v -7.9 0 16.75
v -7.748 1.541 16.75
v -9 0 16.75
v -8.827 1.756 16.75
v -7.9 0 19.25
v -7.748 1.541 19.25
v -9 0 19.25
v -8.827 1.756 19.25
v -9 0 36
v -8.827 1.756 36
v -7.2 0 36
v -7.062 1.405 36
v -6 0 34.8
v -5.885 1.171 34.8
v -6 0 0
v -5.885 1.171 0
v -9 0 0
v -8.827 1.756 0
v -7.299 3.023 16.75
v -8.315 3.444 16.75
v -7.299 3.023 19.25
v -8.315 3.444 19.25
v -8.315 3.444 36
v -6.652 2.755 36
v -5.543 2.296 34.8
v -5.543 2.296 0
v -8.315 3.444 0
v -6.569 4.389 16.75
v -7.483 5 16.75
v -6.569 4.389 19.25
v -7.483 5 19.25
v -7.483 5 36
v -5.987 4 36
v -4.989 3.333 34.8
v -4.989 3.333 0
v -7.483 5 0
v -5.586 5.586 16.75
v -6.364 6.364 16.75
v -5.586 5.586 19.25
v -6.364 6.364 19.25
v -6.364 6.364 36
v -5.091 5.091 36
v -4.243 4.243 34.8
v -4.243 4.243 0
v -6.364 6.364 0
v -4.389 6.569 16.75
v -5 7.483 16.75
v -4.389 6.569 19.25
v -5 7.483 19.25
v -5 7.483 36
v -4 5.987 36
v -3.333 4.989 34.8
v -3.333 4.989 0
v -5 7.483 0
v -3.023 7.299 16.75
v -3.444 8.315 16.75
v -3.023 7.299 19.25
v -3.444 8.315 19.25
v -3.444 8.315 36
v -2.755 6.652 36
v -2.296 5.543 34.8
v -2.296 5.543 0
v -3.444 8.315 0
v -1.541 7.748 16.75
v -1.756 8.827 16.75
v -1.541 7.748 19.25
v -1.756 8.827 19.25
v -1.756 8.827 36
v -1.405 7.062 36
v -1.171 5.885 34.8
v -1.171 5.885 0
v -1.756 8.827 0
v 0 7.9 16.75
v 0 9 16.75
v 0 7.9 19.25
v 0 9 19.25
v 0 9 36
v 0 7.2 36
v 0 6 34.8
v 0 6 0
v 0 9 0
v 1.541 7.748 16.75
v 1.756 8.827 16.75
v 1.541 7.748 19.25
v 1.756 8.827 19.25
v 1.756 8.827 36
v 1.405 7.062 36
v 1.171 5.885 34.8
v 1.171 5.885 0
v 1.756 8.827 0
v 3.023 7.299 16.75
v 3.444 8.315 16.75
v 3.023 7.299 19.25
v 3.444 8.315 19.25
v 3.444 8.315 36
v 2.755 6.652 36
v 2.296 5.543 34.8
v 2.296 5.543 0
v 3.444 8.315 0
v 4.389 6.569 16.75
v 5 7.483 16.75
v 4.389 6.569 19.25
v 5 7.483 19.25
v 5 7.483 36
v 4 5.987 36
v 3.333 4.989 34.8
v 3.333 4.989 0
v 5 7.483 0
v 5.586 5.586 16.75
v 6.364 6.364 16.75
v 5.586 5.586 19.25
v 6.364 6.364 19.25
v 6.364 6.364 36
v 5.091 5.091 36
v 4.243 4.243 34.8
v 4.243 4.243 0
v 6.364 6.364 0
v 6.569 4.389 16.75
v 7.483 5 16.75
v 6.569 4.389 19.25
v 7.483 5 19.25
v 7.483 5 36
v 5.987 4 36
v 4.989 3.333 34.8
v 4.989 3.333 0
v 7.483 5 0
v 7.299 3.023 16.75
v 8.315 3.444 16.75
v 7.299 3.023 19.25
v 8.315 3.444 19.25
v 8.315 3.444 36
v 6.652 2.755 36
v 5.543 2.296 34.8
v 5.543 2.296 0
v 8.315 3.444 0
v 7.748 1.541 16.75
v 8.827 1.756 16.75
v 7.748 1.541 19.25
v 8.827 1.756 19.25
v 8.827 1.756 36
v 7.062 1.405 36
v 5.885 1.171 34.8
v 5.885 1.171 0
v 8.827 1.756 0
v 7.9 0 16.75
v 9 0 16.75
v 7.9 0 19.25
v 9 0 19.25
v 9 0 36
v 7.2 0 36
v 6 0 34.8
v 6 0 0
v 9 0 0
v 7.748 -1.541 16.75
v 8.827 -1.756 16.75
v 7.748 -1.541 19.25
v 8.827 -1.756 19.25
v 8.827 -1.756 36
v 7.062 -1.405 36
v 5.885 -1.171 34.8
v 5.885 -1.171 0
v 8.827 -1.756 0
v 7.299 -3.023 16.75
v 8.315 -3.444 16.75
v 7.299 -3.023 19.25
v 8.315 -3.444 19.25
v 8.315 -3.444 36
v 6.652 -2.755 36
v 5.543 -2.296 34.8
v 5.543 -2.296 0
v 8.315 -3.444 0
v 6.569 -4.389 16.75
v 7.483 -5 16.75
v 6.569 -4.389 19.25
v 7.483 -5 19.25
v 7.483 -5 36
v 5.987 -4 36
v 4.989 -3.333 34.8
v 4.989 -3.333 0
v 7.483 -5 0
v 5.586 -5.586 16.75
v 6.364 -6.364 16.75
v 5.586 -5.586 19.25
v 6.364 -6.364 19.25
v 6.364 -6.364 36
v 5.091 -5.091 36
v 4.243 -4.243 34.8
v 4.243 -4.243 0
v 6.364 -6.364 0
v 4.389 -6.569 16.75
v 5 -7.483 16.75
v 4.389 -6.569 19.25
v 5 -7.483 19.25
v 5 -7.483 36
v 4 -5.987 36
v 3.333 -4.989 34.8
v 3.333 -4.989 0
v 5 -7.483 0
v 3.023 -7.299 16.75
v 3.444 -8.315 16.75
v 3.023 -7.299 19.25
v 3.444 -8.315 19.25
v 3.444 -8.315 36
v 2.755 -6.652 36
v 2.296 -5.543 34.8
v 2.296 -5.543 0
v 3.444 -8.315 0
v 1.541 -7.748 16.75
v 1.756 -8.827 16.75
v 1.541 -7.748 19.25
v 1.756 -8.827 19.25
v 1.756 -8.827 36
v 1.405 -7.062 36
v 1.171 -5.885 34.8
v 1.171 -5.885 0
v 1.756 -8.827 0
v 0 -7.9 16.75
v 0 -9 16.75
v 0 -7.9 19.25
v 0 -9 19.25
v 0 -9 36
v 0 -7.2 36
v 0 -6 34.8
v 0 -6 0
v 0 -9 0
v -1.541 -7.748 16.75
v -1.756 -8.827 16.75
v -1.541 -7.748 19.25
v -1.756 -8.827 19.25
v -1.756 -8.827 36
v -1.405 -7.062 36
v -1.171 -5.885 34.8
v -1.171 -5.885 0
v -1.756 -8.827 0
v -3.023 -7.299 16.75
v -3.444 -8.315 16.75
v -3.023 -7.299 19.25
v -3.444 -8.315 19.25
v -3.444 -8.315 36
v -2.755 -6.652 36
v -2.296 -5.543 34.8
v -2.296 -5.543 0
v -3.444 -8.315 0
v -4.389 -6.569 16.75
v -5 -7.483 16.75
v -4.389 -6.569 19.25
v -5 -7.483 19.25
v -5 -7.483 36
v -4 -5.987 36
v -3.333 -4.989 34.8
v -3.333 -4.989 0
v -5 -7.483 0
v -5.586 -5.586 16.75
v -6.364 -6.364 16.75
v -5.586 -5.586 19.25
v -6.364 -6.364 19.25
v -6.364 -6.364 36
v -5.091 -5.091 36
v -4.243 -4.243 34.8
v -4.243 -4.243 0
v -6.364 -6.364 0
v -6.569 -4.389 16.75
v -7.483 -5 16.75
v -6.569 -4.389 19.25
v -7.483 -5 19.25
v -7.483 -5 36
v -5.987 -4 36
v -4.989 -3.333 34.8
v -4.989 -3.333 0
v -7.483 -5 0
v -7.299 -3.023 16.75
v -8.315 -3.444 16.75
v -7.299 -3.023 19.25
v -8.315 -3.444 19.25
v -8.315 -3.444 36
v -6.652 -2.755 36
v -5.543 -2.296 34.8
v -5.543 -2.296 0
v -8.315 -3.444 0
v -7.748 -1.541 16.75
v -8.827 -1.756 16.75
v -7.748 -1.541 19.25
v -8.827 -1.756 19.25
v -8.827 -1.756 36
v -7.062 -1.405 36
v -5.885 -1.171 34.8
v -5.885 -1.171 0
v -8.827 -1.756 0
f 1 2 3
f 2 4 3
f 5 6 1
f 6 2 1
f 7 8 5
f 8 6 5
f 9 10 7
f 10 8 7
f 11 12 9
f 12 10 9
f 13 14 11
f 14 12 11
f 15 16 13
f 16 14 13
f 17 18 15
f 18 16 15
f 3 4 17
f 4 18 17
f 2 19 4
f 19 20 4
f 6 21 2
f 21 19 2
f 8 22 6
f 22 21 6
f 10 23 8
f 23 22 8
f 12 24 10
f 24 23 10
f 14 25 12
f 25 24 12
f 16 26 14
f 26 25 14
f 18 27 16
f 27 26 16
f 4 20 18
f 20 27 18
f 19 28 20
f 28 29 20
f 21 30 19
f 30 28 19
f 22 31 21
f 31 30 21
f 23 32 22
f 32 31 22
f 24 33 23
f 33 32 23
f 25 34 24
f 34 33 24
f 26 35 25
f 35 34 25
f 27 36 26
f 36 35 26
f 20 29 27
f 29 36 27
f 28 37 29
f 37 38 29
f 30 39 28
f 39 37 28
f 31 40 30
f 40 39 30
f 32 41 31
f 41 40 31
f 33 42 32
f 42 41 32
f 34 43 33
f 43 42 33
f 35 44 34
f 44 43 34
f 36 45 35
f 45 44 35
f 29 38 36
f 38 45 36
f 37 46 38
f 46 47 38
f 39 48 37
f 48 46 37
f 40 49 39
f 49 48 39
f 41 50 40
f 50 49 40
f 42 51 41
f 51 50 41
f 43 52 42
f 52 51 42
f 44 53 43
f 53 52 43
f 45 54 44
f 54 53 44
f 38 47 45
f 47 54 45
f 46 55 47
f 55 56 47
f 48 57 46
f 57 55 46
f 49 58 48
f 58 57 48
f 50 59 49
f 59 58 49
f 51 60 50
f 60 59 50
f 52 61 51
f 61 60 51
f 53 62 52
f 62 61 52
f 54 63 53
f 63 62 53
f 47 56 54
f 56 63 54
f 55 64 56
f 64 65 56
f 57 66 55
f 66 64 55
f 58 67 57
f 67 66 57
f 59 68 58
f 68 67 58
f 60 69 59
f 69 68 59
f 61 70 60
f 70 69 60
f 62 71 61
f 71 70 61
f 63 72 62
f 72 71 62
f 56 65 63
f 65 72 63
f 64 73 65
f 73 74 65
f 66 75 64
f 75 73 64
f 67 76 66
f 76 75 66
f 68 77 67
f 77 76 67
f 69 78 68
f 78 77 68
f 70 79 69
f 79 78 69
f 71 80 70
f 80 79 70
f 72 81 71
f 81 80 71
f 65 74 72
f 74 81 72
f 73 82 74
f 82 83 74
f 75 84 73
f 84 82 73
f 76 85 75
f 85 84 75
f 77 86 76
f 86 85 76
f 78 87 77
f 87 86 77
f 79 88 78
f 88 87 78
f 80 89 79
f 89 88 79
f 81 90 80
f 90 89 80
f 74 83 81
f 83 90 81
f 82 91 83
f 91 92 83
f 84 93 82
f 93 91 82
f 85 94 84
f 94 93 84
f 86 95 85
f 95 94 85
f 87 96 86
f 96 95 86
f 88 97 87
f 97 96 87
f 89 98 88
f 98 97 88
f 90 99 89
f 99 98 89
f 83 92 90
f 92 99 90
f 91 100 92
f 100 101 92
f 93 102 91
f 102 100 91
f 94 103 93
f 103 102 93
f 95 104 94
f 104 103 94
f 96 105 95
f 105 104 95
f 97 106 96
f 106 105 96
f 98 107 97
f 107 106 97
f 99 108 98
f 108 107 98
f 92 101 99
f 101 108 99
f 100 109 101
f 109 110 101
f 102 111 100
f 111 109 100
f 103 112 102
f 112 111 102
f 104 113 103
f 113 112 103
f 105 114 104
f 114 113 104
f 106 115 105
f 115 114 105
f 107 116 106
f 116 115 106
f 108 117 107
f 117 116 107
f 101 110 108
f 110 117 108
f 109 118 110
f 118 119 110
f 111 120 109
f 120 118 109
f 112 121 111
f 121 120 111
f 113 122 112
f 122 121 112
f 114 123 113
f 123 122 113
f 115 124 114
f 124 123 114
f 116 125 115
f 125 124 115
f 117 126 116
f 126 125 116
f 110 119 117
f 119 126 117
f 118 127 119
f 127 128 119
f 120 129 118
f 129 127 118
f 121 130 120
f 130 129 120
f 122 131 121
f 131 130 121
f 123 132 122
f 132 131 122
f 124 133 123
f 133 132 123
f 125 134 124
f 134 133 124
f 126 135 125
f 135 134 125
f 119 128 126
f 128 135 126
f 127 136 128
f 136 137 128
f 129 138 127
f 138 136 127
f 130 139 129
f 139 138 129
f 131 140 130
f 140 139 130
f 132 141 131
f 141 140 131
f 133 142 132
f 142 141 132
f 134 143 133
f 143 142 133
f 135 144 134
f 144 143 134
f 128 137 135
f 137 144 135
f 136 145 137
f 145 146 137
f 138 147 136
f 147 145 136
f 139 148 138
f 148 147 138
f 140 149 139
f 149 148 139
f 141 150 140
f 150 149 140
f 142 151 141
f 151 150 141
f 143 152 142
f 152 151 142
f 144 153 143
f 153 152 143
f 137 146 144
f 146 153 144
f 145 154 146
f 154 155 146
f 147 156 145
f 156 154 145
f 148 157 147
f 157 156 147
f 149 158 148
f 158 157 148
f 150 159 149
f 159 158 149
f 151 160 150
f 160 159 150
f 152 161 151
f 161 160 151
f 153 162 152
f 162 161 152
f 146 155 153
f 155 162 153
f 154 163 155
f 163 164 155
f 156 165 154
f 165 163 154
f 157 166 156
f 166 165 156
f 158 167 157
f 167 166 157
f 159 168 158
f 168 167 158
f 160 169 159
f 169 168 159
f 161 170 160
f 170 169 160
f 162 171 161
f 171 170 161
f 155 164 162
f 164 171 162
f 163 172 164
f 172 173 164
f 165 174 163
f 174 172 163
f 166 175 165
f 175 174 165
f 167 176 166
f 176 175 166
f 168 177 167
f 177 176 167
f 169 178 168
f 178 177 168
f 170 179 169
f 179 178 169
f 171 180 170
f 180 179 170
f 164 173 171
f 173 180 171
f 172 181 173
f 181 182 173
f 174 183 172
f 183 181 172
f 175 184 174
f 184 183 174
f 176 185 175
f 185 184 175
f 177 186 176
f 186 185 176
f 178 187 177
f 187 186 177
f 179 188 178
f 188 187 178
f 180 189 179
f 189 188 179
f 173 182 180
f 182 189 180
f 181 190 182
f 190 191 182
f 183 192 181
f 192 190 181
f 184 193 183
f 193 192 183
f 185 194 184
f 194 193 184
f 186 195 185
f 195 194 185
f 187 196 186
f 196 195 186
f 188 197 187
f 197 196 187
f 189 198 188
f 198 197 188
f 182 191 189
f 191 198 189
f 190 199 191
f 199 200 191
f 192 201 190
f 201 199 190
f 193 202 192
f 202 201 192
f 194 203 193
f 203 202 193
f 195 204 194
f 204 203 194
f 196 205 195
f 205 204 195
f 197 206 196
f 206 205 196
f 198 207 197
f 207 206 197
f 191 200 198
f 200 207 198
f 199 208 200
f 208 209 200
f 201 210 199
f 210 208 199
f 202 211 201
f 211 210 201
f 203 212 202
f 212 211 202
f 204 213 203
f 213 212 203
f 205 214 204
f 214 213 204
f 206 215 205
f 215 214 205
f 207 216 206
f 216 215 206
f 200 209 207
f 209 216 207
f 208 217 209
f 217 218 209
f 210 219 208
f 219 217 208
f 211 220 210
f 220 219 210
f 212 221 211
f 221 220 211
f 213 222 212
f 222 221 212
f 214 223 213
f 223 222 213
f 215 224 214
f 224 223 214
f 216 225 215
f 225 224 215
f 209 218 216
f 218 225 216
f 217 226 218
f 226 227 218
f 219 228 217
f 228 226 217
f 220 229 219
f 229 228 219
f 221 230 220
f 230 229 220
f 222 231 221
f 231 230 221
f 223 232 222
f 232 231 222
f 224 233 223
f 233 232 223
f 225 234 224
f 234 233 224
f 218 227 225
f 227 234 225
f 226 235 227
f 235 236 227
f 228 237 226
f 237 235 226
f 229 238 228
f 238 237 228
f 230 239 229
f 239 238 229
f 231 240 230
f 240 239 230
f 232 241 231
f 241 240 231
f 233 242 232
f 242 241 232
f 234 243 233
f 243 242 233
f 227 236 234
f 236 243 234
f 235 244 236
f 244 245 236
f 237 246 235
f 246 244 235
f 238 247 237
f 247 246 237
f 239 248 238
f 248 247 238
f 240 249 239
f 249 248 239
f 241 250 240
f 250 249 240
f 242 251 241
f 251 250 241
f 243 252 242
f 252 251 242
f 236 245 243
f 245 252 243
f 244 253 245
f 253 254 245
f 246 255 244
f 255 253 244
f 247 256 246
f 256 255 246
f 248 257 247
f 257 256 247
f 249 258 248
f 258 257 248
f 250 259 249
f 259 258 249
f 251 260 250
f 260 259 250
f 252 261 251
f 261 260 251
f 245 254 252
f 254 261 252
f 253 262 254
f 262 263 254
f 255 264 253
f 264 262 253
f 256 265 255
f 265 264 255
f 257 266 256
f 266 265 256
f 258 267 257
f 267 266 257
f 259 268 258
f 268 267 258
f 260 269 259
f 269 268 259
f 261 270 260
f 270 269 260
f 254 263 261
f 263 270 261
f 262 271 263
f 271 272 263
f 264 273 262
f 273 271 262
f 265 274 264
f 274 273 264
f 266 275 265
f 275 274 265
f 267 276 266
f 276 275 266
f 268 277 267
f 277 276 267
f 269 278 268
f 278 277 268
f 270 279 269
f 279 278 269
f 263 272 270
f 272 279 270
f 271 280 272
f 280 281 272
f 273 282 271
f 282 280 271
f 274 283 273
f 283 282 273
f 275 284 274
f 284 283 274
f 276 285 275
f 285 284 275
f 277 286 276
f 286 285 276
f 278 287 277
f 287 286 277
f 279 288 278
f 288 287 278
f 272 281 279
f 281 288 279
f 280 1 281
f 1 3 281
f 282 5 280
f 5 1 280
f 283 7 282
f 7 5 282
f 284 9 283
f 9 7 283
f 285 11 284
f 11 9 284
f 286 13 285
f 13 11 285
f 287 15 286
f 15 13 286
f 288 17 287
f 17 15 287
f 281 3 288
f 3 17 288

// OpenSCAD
$fn = 32;

// ----------------------------------------------------------------------
// Grooved revolve: thread_relief, bore R6
// ----------------------------------------------------------------------

// --- parameters (mm) ---
bore_r = 6;               // bore radius
outer_r = 9;              // outer radius of the body
total_h = 36;             // overall height, Z
wall = 3;                 // radial wall thickness
groove_w = 2.5;           // groove width
groove_d = 1.1;           // groove depth
grooves = 1;              // number of outer grooves
relief = 1.2;             // thread relief leg at the bore mouth
relief_angle = 45;        // thread relief chamfer angle, degrees

bbox_x = 2 * outer_r;  // full diameter
bore_d = 2 * bore_r;  // bore diameter
body_d = 2 * outer_r;  // body diameter
revolve_angle = 360;  // full turn around the Z axis

profile = [[6, 0], [9, 0], [9, 16.75], [7.9, 16.75], [7.9, 19.25], [9, 19.25], [9, 36], [7.2, 36], [6, 34.8]];  // primary outline, 9 points, counter clockwise

// --- the one profile operation ---
rotate_extrude(angle = revolve_angle) polygon(points = profile);
